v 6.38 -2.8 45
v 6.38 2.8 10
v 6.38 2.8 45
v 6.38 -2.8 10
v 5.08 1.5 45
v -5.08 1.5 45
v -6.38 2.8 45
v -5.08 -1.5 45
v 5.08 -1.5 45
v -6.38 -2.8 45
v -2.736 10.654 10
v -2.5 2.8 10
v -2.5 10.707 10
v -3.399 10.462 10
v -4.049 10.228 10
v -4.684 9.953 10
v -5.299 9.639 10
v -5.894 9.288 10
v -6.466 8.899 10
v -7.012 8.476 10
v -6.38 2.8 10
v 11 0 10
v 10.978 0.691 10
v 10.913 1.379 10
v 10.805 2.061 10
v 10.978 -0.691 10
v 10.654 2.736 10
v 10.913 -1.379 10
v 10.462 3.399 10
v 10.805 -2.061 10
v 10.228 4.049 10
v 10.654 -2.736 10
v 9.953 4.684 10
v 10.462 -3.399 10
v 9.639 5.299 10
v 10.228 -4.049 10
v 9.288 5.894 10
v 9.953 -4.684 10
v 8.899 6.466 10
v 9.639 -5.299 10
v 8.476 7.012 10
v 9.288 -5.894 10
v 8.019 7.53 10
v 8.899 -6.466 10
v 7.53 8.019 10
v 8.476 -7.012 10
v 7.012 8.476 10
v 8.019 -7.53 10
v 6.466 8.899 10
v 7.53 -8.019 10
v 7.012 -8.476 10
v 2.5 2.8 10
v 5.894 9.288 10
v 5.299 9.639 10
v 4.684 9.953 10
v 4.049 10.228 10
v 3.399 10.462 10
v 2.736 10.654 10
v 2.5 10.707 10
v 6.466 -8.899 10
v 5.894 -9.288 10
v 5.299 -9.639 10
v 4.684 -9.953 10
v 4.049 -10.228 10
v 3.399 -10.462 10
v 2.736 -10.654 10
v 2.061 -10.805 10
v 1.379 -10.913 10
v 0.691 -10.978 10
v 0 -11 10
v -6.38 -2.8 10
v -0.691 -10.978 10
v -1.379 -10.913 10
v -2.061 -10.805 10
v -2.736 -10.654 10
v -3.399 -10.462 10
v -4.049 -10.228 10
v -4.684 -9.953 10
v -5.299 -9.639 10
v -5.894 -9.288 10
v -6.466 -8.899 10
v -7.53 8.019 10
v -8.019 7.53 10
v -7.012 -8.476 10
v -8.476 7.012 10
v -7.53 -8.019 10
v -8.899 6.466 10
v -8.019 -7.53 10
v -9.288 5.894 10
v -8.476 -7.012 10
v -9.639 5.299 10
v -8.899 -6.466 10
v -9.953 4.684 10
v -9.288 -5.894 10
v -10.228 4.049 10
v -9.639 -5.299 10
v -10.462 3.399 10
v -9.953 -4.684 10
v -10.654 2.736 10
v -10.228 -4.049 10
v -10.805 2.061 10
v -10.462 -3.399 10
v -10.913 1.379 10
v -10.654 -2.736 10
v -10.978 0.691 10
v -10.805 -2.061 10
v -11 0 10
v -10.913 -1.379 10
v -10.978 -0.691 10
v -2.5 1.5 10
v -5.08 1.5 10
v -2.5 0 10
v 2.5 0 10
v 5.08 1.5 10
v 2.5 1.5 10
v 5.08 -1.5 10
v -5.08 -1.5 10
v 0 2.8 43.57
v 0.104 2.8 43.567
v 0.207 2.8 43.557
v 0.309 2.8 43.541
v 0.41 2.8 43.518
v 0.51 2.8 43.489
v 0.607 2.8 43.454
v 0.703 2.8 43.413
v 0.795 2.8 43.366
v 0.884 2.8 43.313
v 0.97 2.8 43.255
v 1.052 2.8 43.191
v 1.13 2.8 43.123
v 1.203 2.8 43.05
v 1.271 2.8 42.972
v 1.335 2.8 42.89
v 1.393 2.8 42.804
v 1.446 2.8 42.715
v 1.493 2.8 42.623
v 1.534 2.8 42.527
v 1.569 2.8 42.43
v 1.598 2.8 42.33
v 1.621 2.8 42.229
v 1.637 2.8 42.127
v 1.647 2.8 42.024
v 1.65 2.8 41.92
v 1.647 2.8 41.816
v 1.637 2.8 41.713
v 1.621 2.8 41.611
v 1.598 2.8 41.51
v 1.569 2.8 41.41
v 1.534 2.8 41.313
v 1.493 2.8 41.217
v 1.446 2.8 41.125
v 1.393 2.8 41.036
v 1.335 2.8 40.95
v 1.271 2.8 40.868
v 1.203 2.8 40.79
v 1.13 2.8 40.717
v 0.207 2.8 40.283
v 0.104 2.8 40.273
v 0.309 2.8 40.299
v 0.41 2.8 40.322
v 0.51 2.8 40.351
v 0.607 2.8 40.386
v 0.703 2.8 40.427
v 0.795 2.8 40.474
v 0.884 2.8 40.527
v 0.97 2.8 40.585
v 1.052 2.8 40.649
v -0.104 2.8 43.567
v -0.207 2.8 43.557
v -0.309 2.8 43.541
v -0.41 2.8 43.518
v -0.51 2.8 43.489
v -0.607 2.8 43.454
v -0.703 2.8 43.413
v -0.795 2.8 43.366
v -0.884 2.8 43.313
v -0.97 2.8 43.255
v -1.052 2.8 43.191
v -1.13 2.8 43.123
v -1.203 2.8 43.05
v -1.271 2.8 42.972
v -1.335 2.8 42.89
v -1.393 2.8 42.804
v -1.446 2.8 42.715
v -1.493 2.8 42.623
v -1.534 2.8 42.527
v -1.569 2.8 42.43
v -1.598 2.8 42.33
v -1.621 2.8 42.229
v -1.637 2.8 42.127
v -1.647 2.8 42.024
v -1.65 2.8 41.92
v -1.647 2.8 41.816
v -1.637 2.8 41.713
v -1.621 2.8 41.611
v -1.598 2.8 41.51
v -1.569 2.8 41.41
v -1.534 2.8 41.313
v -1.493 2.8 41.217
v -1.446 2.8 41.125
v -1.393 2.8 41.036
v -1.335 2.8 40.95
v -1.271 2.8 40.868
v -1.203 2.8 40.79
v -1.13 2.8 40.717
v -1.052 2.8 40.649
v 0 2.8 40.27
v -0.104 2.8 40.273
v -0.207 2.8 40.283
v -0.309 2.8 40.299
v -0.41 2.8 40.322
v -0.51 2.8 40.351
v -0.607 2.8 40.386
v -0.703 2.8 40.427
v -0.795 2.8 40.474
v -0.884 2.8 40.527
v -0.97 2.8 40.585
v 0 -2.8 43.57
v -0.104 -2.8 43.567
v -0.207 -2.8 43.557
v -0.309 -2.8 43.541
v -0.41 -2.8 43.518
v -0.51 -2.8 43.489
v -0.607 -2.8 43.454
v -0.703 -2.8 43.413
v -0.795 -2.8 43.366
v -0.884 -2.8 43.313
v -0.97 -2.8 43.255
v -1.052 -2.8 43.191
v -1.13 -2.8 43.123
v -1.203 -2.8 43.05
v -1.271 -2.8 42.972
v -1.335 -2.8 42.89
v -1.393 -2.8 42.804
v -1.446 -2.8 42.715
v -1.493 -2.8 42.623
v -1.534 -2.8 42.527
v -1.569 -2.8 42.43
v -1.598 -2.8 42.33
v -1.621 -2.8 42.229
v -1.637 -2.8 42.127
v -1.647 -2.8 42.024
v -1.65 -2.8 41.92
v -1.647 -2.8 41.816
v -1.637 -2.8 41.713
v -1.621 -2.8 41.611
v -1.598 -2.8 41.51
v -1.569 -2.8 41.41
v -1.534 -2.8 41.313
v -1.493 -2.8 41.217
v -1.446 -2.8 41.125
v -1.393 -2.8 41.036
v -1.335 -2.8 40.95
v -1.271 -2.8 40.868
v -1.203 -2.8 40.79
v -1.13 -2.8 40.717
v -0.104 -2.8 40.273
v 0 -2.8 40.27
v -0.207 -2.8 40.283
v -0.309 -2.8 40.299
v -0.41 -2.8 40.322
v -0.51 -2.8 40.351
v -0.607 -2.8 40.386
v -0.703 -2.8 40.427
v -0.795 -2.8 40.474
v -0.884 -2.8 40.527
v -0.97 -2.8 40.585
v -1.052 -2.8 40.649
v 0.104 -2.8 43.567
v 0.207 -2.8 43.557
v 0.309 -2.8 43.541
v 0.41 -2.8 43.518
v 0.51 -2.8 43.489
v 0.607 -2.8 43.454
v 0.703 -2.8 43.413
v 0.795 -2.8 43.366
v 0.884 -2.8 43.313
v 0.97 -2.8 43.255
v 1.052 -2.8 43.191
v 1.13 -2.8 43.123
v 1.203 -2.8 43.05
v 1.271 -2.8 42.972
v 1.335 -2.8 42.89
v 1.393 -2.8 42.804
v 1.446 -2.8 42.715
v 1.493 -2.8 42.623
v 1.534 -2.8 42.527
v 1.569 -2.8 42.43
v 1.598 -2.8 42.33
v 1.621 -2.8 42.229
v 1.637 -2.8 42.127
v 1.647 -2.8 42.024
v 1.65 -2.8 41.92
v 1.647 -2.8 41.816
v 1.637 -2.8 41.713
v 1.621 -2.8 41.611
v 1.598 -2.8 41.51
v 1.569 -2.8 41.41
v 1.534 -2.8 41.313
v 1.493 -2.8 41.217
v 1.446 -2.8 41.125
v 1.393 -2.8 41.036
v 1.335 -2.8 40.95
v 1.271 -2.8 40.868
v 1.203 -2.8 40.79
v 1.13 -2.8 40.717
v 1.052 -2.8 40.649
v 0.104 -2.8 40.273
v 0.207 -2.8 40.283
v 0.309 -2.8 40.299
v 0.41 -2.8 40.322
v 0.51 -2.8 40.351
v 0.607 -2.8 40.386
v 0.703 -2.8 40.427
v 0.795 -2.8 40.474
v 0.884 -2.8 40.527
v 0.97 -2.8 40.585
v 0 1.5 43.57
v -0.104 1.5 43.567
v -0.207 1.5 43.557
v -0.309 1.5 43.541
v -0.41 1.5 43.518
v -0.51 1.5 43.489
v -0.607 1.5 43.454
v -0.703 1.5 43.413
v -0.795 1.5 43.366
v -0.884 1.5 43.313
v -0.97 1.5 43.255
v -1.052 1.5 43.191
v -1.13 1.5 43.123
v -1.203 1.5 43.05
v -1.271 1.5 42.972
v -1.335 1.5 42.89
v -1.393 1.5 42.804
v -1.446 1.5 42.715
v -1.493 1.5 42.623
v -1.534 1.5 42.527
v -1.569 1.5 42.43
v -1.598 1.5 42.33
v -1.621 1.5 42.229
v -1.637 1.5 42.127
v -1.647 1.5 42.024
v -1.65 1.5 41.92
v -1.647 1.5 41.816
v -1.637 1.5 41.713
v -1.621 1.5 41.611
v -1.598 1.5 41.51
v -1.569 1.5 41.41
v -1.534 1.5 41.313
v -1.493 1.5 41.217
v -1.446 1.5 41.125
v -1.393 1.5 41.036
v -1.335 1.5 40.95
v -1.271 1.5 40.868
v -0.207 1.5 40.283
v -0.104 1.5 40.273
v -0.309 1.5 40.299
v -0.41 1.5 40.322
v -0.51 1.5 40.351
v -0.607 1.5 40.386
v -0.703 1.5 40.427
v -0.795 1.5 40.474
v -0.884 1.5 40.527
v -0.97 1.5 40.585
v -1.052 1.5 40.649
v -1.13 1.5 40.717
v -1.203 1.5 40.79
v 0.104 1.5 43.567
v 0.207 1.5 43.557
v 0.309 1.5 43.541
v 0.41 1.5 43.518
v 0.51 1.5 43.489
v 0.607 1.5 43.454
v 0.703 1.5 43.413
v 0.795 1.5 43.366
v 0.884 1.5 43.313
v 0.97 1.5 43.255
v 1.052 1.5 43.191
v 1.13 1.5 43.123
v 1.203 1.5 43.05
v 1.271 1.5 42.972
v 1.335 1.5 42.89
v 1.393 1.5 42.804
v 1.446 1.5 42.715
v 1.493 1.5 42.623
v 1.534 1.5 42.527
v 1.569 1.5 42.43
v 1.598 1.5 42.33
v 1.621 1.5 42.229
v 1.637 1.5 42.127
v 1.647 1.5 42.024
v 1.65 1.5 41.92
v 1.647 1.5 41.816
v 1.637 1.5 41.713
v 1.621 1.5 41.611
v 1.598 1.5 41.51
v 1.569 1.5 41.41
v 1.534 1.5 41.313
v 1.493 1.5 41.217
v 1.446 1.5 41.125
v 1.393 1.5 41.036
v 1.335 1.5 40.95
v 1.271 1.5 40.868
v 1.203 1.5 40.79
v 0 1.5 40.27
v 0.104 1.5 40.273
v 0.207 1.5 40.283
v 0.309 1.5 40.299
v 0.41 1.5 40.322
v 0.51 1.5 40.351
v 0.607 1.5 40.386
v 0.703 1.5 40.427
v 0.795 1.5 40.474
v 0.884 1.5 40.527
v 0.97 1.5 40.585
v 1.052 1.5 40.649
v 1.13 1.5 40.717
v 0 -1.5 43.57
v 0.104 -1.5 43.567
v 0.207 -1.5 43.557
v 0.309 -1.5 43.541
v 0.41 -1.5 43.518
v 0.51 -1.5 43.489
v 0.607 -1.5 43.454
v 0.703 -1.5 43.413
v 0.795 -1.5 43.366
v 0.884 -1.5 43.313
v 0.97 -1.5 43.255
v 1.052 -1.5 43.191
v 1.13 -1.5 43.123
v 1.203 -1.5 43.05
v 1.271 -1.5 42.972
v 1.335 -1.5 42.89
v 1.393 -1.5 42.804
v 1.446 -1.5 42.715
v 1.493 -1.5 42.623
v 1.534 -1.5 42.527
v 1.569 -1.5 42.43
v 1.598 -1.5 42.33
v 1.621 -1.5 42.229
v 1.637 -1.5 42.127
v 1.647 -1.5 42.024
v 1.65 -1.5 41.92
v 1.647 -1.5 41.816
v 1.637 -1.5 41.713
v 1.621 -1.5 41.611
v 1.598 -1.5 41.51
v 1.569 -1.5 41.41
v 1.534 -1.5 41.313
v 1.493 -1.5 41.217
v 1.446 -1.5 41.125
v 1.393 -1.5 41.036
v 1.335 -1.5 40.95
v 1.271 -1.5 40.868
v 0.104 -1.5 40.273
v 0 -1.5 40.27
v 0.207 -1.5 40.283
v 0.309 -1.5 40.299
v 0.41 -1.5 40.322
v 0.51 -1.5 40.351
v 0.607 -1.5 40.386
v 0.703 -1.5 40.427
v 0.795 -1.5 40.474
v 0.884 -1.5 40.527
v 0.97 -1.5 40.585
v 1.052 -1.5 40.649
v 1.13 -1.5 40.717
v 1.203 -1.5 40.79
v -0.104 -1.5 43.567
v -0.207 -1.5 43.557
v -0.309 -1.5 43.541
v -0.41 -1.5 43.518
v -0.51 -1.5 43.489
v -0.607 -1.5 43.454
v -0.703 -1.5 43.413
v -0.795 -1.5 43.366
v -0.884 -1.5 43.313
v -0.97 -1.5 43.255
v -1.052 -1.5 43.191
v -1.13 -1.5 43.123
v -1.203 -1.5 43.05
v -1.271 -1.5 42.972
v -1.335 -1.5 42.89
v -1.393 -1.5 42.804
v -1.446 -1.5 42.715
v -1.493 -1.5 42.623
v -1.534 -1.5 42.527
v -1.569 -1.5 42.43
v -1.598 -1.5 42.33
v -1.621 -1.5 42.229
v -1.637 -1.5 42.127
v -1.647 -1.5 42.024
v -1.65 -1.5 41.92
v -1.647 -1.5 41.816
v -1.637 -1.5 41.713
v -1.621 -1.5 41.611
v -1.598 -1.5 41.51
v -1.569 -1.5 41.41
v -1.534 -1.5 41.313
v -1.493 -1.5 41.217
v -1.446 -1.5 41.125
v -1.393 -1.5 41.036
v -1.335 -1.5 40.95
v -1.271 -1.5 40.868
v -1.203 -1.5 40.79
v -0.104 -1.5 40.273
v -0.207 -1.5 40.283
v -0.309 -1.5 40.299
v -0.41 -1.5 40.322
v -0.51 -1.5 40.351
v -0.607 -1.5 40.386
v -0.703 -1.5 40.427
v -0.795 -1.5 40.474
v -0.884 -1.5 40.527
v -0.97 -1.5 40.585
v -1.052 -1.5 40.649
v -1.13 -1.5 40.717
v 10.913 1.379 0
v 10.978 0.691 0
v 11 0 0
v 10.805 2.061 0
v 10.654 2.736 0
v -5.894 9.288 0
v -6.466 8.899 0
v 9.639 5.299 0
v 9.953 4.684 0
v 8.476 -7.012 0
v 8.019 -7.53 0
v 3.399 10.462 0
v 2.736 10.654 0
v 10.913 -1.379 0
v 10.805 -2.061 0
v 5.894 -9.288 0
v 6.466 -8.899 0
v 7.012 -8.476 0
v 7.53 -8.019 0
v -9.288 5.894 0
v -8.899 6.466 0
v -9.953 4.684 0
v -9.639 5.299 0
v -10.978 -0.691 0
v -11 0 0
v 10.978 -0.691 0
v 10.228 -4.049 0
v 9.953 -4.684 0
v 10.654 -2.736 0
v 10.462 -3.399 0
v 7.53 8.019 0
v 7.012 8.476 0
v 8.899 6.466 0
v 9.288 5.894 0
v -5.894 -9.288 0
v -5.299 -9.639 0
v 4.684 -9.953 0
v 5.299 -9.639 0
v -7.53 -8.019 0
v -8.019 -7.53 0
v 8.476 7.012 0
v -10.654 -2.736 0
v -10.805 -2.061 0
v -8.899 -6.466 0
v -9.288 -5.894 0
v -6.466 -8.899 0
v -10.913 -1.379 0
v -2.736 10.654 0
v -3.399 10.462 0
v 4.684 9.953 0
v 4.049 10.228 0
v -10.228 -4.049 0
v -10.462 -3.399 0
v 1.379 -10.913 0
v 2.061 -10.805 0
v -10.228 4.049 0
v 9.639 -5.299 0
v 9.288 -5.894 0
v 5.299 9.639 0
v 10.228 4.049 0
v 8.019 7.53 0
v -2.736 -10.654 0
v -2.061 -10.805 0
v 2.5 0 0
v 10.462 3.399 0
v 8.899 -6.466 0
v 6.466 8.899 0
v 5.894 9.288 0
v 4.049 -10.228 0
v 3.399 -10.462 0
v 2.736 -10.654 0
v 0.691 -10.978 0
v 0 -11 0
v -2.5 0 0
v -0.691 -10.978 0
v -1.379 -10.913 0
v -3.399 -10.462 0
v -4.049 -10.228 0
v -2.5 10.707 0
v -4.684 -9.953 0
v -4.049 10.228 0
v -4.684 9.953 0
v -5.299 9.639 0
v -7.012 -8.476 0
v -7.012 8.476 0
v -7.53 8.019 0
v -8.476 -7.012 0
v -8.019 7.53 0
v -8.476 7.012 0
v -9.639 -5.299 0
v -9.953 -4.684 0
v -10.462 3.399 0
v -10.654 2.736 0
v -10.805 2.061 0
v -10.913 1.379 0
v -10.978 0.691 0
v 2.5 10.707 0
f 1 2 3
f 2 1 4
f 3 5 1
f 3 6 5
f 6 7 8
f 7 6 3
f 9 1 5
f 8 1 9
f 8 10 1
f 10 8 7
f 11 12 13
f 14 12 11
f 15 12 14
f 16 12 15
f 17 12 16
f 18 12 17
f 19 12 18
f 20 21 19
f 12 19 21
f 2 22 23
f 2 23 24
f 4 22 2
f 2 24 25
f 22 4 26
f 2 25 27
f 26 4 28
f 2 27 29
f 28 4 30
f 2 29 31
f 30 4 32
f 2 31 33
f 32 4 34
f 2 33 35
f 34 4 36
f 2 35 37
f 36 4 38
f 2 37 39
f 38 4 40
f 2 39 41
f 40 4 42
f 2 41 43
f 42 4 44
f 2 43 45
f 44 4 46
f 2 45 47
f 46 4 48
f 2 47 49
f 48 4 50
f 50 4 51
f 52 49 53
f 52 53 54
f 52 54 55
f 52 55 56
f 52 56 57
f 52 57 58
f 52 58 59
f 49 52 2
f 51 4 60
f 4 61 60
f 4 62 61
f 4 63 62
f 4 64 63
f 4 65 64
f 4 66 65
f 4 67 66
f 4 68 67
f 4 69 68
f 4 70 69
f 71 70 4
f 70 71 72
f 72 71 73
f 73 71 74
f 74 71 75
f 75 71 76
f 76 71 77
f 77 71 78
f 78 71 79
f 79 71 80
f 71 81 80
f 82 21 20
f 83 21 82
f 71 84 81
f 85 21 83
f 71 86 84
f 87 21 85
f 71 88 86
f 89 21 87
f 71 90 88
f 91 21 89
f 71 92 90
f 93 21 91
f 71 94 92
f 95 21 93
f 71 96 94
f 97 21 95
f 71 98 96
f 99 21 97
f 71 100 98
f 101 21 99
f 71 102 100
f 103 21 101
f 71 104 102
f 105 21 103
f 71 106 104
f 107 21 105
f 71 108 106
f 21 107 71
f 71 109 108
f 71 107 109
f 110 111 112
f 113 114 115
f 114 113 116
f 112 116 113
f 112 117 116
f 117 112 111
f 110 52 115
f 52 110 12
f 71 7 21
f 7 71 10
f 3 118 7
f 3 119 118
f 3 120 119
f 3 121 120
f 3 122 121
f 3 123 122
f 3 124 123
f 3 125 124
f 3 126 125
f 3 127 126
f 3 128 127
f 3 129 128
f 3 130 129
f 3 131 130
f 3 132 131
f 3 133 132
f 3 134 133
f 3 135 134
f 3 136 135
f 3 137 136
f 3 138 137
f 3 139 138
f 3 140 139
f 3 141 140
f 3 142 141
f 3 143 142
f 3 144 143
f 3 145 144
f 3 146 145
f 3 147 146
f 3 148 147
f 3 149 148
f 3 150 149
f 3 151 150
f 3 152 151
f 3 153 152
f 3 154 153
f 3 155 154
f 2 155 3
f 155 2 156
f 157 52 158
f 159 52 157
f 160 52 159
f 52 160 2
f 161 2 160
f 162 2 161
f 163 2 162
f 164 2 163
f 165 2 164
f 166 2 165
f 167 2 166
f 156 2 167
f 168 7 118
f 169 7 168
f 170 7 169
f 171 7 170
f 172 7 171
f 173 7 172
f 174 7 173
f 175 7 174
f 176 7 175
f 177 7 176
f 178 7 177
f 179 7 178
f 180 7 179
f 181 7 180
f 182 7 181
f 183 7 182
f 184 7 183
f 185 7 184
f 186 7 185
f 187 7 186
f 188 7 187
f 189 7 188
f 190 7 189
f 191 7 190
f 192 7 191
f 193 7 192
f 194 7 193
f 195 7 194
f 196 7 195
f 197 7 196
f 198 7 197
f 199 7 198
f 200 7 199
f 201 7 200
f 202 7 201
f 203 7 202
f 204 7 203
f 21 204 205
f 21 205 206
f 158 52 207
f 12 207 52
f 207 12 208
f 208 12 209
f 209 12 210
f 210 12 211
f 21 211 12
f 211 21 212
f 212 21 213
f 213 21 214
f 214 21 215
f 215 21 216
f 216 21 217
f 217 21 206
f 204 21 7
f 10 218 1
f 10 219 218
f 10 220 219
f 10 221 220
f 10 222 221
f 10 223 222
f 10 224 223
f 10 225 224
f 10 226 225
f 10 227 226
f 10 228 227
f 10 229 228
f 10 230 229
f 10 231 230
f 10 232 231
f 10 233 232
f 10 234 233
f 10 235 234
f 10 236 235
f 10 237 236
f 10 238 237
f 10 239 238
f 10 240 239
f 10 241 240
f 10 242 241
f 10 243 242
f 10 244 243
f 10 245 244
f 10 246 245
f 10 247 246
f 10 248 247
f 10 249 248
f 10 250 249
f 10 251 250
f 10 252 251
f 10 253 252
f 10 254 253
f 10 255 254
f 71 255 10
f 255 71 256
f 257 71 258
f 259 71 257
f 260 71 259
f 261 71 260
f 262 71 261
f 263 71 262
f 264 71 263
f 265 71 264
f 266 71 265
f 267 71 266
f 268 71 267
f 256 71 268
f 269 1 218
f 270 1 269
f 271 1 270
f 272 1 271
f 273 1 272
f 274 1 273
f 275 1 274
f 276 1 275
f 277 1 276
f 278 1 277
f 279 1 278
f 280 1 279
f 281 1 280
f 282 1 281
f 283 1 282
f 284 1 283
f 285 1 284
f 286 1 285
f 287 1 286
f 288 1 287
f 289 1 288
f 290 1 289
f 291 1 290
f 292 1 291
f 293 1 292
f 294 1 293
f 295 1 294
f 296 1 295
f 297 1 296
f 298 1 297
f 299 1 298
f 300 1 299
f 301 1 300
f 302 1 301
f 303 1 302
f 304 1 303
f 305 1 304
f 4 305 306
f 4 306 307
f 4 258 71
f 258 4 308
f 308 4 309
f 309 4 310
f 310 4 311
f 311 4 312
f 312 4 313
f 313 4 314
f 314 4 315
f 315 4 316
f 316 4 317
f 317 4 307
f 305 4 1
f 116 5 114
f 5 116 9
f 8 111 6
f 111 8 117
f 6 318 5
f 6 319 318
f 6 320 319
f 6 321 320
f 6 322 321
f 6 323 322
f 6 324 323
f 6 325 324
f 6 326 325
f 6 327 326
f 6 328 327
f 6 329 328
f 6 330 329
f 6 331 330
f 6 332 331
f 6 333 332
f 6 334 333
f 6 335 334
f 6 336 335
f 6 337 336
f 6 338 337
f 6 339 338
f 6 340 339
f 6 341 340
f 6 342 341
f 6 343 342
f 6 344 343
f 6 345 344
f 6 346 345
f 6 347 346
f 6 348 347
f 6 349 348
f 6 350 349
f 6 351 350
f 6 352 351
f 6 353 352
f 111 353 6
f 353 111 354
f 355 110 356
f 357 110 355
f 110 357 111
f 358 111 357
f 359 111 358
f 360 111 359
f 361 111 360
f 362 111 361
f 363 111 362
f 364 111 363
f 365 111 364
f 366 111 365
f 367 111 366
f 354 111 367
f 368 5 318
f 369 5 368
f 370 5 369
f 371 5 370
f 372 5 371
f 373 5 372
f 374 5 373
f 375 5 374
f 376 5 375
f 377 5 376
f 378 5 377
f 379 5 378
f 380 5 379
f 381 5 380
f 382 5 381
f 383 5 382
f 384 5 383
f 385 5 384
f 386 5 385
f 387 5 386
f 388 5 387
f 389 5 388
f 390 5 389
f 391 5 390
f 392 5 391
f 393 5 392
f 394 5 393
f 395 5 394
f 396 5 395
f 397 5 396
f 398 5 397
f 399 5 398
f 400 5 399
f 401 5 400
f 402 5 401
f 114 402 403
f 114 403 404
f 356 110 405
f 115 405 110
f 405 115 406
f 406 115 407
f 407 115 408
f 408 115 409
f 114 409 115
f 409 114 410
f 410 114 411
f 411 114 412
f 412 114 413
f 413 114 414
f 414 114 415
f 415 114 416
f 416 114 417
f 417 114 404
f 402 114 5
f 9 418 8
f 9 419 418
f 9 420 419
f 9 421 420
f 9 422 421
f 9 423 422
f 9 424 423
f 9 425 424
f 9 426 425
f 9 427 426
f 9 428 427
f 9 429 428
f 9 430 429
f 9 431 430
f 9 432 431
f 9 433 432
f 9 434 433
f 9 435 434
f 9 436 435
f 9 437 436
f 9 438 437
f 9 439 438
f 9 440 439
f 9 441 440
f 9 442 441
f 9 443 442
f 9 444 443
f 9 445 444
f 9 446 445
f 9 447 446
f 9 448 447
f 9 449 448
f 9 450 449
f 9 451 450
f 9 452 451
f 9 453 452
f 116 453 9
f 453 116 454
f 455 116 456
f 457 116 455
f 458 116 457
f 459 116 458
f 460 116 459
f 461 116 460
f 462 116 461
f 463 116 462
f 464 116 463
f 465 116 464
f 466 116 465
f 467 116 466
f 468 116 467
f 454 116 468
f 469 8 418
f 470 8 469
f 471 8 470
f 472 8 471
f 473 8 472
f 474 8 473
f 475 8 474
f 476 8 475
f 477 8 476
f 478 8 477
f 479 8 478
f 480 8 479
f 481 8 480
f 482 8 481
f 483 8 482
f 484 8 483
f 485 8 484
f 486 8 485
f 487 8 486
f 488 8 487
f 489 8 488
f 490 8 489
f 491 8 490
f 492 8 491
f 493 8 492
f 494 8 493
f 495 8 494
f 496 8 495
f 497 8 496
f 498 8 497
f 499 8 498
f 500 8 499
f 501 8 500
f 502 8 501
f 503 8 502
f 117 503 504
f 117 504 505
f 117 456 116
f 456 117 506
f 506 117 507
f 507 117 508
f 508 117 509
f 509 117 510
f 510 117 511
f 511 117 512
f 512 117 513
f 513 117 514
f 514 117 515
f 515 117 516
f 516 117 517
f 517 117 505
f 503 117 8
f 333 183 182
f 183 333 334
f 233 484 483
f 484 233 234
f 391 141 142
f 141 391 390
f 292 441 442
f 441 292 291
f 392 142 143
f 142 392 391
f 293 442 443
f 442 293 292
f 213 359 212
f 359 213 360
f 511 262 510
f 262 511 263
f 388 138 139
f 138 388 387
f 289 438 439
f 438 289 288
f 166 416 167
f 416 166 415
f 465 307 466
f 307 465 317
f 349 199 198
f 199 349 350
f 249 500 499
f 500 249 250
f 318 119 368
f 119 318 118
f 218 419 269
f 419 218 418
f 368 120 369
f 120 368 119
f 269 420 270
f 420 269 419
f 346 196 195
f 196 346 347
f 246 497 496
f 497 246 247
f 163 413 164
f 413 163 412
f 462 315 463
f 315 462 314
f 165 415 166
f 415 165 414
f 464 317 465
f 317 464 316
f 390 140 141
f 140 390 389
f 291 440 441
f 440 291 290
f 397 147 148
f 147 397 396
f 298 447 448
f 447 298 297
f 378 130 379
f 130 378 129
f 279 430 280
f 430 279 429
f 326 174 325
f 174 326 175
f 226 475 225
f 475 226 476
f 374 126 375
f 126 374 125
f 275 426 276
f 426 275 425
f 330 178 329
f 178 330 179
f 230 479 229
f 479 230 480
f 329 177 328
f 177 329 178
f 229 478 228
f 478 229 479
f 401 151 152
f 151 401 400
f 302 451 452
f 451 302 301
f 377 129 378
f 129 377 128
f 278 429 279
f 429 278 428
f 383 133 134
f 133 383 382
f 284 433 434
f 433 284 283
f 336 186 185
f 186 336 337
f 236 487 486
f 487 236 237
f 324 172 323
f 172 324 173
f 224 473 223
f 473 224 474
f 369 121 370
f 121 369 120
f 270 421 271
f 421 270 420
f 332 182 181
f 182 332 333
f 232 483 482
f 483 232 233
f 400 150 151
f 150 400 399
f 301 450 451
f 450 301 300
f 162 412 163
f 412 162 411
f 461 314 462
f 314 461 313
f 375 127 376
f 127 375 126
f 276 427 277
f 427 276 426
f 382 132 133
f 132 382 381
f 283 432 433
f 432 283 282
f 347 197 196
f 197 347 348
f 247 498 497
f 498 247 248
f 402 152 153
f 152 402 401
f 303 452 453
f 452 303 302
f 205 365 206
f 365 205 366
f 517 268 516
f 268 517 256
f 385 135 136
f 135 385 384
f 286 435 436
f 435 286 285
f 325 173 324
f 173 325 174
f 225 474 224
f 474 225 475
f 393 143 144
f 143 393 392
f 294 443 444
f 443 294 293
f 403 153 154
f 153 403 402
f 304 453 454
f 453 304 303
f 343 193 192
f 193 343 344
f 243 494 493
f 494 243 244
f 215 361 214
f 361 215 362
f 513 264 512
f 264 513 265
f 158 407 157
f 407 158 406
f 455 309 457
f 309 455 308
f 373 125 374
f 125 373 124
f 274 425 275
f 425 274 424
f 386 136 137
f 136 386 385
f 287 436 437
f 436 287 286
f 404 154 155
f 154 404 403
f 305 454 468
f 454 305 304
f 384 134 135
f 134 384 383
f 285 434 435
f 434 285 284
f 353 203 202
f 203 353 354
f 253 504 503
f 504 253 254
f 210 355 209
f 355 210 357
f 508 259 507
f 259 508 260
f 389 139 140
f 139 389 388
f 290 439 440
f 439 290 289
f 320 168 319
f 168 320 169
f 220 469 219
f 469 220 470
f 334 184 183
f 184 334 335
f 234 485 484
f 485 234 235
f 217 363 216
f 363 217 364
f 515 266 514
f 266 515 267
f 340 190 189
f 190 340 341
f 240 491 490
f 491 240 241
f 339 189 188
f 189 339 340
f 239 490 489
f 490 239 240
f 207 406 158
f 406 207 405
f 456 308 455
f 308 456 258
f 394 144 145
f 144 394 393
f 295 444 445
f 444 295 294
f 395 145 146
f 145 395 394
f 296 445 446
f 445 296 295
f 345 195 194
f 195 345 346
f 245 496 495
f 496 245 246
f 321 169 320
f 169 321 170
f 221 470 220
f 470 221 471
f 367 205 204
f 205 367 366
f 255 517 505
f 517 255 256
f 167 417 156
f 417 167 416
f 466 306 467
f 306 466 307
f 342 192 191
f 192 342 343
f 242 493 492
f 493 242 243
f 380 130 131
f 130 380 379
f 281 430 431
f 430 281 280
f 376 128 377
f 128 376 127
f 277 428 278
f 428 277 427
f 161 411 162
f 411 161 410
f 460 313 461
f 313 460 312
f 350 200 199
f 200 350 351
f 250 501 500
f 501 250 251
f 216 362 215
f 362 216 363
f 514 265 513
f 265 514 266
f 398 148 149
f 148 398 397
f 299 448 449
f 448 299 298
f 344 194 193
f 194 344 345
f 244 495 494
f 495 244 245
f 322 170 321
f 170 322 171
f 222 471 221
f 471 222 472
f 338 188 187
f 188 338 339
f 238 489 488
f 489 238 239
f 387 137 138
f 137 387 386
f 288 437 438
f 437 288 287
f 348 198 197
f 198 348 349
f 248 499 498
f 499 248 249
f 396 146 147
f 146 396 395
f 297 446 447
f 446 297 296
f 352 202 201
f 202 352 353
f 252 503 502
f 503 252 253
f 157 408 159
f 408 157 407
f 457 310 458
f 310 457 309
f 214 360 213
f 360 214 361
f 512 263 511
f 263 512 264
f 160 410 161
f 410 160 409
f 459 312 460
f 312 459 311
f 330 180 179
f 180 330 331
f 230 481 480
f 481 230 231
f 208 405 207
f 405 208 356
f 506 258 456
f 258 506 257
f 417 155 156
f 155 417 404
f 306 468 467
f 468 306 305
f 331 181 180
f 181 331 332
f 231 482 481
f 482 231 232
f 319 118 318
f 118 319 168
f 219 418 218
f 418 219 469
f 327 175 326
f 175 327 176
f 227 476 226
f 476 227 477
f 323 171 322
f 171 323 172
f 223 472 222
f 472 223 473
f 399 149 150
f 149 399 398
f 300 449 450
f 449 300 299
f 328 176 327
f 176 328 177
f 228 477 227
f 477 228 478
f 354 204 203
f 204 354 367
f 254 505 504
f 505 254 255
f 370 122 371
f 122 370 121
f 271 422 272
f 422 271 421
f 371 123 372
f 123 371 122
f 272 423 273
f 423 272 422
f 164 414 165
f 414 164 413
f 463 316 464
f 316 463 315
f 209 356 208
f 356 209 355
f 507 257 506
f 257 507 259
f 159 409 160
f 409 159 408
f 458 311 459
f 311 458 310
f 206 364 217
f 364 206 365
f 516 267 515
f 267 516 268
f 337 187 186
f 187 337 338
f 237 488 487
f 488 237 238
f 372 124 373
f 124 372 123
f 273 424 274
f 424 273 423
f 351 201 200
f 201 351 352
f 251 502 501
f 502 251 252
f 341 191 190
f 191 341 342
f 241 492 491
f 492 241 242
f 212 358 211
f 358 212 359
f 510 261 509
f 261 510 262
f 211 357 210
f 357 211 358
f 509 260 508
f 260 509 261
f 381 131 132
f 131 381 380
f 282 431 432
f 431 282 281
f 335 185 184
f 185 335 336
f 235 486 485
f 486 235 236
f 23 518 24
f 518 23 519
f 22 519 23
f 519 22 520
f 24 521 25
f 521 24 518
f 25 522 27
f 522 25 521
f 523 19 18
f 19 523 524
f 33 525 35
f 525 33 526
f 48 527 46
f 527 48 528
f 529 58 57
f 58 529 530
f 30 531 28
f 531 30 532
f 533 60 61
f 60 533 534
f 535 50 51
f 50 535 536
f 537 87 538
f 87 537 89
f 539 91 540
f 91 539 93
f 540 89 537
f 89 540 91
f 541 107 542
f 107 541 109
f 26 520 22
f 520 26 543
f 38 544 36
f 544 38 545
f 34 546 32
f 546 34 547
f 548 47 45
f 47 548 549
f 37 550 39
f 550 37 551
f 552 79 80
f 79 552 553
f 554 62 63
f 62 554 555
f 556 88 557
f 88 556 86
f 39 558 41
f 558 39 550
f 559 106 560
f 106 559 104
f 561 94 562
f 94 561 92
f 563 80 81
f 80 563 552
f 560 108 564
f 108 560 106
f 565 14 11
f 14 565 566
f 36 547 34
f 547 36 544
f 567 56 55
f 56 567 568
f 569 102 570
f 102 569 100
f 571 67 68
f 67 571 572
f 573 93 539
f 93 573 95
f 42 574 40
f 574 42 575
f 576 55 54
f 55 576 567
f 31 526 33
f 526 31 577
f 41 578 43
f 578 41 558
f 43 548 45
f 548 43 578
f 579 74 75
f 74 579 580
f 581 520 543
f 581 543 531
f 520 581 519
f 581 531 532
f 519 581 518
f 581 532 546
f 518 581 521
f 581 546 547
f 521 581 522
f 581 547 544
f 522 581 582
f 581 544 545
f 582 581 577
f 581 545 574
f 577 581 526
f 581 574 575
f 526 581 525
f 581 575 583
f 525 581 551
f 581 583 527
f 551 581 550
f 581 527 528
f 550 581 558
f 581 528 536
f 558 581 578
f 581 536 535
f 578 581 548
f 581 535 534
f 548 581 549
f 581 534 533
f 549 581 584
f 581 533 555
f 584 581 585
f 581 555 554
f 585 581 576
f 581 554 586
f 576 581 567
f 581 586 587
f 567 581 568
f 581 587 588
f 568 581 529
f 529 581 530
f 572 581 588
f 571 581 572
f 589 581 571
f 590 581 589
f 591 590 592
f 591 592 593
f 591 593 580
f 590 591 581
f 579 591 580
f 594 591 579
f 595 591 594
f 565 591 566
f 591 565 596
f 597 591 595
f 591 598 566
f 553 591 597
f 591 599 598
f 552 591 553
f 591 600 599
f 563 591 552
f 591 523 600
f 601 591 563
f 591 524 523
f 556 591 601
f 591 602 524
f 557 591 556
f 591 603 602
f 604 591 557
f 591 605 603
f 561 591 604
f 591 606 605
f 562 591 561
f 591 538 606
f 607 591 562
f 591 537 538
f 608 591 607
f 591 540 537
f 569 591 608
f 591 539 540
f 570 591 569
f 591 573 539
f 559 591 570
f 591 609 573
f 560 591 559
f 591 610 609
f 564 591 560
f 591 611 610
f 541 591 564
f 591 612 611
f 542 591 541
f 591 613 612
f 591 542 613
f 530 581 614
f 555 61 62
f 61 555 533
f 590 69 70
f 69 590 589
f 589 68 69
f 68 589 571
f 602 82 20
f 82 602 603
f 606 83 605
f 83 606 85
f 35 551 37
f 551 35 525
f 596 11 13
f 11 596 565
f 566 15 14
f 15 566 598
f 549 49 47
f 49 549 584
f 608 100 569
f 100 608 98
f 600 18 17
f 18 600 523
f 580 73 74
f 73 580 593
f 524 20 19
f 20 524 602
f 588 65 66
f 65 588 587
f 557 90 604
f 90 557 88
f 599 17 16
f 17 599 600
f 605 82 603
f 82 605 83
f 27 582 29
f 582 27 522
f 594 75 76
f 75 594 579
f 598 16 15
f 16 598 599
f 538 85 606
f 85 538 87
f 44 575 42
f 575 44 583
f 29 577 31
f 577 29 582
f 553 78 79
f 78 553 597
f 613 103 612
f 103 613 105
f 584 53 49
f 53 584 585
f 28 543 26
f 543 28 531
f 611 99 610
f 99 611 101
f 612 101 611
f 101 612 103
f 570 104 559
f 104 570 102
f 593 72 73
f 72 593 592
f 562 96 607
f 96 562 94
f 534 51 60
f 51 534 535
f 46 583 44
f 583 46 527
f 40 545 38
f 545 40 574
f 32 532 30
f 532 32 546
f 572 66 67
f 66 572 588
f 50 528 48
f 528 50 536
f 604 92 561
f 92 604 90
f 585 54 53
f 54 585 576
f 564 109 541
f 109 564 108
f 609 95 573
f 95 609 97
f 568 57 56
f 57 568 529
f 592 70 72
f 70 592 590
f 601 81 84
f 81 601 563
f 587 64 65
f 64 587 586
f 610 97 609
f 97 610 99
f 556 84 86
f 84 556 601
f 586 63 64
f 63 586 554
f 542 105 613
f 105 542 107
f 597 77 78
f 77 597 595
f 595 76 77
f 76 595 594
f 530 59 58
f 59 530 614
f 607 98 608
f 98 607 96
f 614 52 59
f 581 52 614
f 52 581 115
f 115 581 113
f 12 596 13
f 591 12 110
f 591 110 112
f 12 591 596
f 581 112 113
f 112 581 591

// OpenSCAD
// file: ../configuration.scad
$fn=40; // model faces resolution.

//Parametry pro D01 a D02
//nastavení držáku na sloup
//----------------------------------------------------------------
//----------------------------------------------------------------
//není potřeba měnit
S01_prumer_vnitrni=40;
S01_tolerance_zavit=1.5;

S01_sila_materialu=1.3; //sila výtuhy

//D01 - uchyt velky
D01_material_pod_zavitem=5;
D01_material_za_zavitem=3;
D01_material_pred_zavitem=2;
D01_delka_tyce=30;
D01_sirka_tyce=15;

//D02 - uchyt na sloup
D02_sila_materialu=5;
D02_vyska_uchytky=40;
D02_prumer_obruby=27; //3/4 trubka
D02_delka_celeho_uchytu=60;
D02_dotahova_vzdalenost=1.5;
D02_prumer_uchytneho_sroubu=4.2;
D02_sirka_matky=9.1; //pro M4
D02_vyska_matky=3;


D05_vyska_drzaku_senzoru=35;
D05_prumer_zkumavky_vnitrni=22;
D05_vyska_podstavce=10;
D05_sirka_otvoru_na_kabel=5;
// main file
$fn=40; // model faces resolution.
include <../configuration.scad>


//Drzak senzoru
module ISLHOLDER01A_D05()
    {
    translate([0,0,(D05_vyska_drzaku_senzoru)/2+D05_vyska_podstavce])
        difference()
            {
            cube([10.16+2*S01_sila_materialu,3+2*S01_sila_materialu,D05_vyska_drzaku_senzoru],true);

            cube([10.16,3,D05_vyska_drzaku_senzoru+0.01],true);
            
            translate([0,5,D05_vyska_drzaku_senzoru/2-3.08])
                rotate ([90,0,0])
                    cylinder (h = 30, r=(3.3/2), $fn=100);
            
            }
            
   difference()
        {         
        cylinder (h = D05_vyska_podstavce, r=D05_prumer_zkumavky_vnitrni/2, $fn=100);
        
        translate([0,D05_prumer_zkumavky_vnitrni/4,D05_vyska_podstavce/2])  
            cube([D05_sirka_otvoru_na_kabel,D05_prumer_zkumavky_vnitrni/2,D05_vyska_podstavce+0.11],true); 
            
       }
    }

ISLHOLDER01A_D05();
